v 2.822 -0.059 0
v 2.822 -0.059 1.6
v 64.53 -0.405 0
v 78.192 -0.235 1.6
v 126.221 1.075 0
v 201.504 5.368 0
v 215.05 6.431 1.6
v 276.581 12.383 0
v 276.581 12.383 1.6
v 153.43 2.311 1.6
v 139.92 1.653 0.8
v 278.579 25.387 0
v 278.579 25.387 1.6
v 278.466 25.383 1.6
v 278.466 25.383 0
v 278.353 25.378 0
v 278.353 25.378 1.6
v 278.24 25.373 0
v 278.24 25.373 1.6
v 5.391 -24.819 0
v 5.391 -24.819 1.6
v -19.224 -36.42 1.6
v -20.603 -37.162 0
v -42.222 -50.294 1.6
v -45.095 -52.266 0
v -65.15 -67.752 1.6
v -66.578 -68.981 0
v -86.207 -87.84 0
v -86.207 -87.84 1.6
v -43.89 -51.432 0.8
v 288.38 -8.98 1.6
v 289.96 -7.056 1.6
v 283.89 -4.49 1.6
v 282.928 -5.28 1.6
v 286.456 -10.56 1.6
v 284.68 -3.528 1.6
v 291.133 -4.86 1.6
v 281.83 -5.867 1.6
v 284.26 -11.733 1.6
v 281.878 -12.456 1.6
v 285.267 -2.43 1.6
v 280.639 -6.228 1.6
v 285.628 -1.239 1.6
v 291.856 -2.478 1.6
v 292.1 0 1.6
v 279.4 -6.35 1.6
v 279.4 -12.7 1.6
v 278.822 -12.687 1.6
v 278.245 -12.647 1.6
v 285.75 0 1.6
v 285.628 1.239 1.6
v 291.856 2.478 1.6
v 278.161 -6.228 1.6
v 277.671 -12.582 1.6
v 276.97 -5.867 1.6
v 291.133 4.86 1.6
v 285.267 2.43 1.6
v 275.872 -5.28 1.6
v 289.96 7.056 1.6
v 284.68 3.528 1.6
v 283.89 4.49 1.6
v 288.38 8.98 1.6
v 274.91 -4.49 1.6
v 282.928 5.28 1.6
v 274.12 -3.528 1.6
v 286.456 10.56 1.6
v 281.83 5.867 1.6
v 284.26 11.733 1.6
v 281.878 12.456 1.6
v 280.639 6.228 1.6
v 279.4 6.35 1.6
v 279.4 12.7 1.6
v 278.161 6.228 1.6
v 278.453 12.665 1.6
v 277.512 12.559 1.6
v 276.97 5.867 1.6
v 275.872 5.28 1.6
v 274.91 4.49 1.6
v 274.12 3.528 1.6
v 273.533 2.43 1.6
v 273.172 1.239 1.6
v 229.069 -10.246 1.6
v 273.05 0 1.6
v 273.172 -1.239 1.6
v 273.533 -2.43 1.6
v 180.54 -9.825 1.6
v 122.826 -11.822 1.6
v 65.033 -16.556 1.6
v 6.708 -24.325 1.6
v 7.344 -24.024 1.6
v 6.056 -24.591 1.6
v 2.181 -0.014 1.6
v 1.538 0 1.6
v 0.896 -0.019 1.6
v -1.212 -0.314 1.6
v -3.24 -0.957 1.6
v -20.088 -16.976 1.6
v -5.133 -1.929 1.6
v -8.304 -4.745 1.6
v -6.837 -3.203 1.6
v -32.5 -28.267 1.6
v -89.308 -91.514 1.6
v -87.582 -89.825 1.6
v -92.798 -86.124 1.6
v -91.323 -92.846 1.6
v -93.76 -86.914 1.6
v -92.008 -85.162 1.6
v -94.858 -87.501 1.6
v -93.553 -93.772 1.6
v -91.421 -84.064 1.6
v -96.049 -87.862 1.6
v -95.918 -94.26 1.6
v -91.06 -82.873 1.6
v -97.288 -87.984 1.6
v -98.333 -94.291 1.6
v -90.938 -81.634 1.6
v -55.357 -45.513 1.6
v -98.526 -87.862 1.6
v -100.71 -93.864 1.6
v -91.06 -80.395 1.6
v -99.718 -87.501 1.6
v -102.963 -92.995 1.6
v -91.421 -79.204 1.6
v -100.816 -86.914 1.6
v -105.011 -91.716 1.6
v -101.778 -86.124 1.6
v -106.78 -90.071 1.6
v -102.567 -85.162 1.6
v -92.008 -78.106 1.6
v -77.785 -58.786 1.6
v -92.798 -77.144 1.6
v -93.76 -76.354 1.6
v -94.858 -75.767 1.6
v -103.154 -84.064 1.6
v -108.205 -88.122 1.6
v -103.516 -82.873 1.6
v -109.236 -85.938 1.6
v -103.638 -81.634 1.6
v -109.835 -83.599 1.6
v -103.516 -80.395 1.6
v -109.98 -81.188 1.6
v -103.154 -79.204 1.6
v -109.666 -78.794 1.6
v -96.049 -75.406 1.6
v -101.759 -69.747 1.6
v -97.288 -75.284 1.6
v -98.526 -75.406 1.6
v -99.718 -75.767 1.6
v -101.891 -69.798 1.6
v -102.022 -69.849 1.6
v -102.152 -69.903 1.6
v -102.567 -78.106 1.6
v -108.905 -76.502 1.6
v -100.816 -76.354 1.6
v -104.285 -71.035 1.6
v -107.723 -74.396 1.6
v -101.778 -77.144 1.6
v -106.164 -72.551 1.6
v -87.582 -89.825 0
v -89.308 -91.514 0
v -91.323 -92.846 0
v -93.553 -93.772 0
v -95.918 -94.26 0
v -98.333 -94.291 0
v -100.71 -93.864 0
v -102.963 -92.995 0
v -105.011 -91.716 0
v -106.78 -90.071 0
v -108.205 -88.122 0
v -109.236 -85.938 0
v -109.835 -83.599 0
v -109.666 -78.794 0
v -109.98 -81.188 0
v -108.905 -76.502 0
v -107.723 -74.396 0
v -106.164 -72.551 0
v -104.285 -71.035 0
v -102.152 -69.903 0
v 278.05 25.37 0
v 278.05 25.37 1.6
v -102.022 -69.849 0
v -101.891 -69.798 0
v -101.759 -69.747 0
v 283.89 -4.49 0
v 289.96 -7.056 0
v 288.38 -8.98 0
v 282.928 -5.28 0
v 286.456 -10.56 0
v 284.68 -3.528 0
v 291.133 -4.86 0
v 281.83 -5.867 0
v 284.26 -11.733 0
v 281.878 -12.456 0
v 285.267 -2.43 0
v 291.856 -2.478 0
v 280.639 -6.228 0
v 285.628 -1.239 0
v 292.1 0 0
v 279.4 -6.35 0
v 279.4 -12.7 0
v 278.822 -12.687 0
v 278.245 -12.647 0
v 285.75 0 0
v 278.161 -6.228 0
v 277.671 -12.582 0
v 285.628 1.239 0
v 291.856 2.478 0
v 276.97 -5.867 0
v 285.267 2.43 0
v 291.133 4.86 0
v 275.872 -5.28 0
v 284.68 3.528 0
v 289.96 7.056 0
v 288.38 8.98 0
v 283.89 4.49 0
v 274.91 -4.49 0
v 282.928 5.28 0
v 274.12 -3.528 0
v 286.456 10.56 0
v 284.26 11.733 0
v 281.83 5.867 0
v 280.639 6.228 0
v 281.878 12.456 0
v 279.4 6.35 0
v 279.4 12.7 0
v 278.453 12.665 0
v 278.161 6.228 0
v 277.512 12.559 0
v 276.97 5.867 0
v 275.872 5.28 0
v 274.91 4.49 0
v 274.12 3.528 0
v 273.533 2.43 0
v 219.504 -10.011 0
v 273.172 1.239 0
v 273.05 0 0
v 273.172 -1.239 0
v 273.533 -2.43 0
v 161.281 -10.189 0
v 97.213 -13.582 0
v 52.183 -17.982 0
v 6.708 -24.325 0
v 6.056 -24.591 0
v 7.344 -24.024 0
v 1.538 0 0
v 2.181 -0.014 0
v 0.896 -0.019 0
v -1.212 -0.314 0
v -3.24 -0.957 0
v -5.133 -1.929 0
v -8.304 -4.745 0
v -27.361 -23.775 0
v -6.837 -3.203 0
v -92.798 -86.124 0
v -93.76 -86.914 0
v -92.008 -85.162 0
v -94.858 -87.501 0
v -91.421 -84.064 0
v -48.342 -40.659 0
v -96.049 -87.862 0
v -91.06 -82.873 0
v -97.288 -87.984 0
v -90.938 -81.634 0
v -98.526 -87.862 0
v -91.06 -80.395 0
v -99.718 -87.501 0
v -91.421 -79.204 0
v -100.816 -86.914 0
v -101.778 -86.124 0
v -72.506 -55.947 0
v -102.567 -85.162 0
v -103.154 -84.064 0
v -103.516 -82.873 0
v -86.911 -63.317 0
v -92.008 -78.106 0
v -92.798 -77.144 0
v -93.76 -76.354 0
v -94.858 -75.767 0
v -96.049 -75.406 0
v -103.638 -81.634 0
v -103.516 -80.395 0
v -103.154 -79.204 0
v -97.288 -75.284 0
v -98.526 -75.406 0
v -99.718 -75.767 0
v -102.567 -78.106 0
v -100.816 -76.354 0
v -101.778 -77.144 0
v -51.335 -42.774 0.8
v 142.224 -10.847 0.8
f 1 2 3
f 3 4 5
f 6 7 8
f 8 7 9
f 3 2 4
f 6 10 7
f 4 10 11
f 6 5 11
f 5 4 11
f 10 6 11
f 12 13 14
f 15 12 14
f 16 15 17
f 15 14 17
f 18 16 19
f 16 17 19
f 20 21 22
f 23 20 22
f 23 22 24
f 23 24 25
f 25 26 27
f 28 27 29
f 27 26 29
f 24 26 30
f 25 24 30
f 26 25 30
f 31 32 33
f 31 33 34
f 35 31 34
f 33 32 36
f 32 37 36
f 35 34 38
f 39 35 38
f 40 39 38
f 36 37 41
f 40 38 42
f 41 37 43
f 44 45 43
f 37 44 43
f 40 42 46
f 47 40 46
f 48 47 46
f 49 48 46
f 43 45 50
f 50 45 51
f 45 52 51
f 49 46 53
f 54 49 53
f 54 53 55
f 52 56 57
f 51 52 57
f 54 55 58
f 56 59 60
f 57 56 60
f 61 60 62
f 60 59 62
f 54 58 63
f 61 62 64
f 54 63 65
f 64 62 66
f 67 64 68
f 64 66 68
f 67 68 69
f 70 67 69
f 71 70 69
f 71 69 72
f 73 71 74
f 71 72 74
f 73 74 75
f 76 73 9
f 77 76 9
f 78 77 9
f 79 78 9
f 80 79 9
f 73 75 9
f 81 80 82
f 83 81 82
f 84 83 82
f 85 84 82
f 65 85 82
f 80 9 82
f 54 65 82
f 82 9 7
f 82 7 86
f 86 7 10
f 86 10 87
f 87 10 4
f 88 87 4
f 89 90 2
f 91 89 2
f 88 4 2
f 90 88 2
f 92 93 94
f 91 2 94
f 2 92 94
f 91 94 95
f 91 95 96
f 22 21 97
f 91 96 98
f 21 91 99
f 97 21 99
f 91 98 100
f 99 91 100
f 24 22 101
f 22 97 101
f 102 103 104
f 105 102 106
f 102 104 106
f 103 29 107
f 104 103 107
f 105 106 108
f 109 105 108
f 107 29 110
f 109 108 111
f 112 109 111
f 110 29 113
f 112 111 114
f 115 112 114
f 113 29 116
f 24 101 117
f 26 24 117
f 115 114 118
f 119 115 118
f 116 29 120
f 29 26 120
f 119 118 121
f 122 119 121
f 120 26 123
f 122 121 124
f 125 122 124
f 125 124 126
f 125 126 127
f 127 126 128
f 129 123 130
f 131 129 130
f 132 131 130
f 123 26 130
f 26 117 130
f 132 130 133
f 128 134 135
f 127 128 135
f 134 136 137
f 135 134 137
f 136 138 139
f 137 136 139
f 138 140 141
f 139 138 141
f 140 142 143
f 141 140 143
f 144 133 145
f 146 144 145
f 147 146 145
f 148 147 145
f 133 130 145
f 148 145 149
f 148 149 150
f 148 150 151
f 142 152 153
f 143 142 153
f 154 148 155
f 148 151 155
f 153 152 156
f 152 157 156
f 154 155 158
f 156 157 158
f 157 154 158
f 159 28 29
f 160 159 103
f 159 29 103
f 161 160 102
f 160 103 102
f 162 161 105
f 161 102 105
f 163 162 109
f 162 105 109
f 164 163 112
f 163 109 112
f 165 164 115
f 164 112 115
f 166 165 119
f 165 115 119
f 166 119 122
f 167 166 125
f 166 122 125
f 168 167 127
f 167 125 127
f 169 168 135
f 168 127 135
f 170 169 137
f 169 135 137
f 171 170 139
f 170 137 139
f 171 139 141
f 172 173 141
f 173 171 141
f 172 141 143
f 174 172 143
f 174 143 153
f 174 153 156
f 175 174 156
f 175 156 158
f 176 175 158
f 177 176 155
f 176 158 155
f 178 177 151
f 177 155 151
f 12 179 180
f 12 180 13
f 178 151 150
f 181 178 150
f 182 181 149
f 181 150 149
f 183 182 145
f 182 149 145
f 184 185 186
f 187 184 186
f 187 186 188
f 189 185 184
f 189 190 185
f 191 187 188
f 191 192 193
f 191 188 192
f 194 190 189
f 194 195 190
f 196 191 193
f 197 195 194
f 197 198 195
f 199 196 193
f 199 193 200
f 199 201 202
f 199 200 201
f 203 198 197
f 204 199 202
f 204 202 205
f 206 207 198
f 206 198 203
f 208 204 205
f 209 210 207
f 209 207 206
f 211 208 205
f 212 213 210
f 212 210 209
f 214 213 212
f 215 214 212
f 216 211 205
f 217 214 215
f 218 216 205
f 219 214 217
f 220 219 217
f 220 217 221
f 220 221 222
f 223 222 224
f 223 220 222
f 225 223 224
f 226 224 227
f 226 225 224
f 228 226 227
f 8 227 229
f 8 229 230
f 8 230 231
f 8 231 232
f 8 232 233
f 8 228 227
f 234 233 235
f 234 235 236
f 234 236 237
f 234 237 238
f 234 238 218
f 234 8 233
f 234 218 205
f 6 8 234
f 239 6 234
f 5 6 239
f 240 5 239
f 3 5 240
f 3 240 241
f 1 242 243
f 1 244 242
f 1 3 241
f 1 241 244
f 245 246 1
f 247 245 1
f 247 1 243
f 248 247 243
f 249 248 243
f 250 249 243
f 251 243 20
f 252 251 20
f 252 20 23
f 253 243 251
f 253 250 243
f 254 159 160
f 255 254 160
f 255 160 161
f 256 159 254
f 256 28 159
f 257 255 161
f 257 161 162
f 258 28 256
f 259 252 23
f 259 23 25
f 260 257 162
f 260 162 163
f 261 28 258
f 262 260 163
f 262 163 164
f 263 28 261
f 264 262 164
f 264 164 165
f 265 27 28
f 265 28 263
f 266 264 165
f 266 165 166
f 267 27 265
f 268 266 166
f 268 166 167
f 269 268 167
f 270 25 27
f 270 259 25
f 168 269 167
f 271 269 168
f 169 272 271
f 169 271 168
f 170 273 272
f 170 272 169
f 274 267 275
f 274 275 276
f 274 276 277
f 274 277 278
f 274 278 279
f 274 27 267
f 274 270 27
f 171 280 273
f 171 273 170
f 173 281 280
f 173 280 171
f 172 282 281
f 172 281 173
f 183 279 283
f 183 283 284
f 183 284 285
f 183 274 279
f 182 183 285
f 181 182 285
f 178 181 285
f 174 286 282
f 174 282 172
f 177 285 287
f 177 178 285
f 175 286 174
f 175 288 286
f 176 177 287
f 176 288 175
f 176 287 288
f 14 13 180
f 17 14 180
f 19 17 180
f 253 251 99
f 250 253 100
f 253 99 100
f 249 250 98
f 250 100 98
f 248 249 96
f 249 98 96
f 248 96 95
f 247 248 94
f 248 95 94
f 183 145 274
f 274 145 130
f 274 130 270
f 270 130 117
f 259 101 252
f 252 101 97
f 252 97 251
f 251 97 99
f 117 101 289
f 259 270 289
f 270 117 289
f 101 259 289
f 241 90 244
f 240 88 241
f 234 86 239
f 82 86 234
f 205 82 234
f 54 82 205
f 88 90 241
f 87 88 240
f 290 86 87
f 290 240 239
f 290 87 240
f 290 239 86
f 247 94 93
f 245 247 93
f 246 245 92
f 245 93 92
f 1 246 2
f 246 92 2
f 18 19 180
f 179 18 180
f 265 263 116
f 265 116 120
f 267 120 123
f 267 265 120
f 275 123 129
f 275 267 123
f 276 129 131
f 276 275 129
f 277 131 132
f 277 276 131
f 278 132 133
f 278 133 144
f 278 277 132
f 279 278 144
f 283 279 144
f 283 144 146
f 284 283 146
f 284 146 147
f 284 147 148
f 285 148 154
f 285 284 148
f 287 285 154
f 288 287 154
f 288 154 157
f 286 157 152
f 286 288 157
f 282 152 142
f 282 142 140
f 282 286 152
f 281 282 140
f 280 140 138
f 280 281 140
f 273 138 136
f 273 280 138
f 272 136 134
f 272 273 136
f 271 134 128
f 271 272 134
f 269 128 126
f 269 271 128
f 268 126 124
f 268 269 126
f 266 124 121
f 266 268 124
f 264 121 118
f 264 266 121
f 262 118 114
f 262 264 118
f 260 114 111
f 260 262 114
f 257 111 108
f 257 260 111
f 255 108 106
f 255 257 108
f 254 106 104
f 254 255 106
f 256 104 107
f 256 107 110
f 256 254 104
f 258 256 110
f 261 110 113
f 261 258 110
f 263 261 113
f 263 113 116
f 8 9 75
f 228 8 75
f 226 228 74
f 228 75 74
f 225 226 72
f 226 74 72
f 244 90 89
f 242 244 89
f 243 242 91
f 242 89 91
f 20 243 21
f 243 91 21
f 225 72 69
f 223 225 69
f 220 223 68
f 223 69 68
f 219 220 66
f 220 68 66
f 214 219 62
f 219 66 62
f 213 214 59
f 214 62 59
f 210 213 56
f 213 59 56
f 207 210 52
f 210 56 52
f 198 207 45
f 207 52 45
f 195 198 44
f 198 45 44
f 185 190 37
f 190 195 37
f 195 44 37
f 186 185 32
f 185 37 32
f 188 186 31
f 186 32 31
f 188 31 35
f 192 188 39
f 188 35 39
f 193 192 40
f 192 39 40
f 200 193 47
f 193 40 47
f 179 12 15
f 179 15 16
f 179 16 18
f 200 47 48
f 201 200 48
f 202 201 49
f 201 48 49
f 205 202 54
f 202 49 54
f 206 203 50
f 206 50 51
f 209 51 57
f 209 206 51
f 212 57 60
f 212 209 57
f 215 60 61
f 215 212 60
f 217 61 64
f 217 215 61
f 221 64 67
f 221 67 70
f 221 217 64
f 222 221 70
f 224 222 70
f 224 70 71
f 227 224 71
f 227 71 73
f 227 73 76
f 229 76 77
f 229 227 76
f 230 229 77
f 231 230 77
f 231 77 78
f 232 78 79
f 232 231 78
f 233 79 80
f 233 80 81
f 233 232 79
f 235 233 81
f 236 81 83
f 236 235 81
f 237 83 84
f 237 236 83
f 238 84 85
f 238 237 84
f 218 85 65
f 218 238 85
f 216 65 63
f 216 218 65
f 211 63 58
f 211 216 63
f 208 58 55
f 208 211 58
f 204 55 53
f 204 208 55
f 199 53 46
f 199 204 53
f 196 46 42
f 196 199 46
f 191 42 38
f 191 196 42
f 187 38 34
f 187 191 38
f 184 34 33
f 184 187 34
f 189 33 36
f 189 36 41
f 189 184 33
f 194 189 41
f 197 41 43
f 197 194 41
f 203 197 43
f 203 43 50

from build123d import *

# Parameters (mm, degrees)
SKETCH1_R           = 6.35
BOSS_EXTRUDE1_DEPTH = 1.6002
CUT_EXTRUDE1_DEPTH  = 324.050899169


with BuildPart() as part:
    # Sketch1 → Boss-Extrude1 (new body)
    with BuildSketch(Plane.XY):
        with BuildLine():
            Line((2.626401935, -38.912231208), (-82.119119601, -102.007437023))
            ThreePointArc((-82.119119601, -102.007437023), (-117.661054869, -96.802551105), (-112.456168951, -61.260615837))
            Line((-112.456168951, -61.260615837), (-10.589115987, 14.582007538))
            ThreePointArc((-10.589115987, 14.582007538), (-2.059055044, 17.903201209), (7.002261578, 16.605199607))
            Line((7.002261578, 16.605199607), (278.579111194, 25.386731605))
            ThreePointArc((278.579111194, 25.386731605), (304.786731605, 0.820888806), (280.220888806, -25.386731605))
            Line((280.220888806, -25.386731605), (16.974037803, -33.898910196))
            ThreePointArc((16.974037803, -33.898910196), (9.416461191, -35.307290789), (2.626401935, -38.912231208))
        make_face()
        with Locations((279.4, 0)):
            Circle(SKETCH1_R, mode=Mode.SUBTRACT)
        with Locations((-97.287644276, -81.63402643)):
            Circle(SKETCH1_R, mode=Mode.SUBTRACT)
    extrude(amount=BOSS_EXTRUDE1_DEPTH)

    # Sketch2 → Cut-Extrude1 (cut, through all)
    with BuildSketch(Plane.XY.offset(1.6002)):
        with BuildLine():
            Line((-53.969446012, -4.744671806), (-134.329544165, -73.239132517))
            ThreePointArc((-134.329544165, -73.239132517), (-125.60525441, -106.945872422), (-93.084490484, -119.382007693))
            Line((-93.084490484, -119.382007693), (5.391196219, -67.591740386))
            Line((5.391196219, -67.591740386), (280.559963716, -25.373499644))
            ThreePointArc((280.559963716, -25.373499644), (304.773499644, 1.159963716), (278.240036284, 25.373499644))
            Line((278.240036284, 25.373499644), (46.741351585, 20.654902712))
            ThreePointArc((46.741351585, 20.654902712), (10.69565429, 42.688659664), (-30.505126744, 33.346583817))
            ThreePointArc((-30.505126744, 33.346583817), (-46.196248082, 16.739687412), (-53.969446012, -4.744671806))
        make_face()
        with BuildLine():
            ThreePointArc((-102.152006015, -69.902531007), (-101.956358466, -69.823306392), (-101.759421239, -69.747344354))
            add(Edge.make_bspline(
                [(-101.759421239, -69.747344354), (-47.637210532, -48.302448827), (-8.304397238, -4.744671806)],
                knots=[0.003611947, 0.003611947, 0.003611947, 1, 1, 1], degree=2))
            ThreePointArc((-8.304397238, -4.744671806), (-4.207074532, -1.402956863), (0.895916614, -0.019268502))
            ThreePointArc((0.895916614, -0.019268502), (1.85975658, -0.002755052), (2.822072535, -0.059395822))
            add(Edge.make_bspline(
                [(2.822072535, -0.059395822), (140.13746109, -2.856877681), (276.581108414, 12.383208398)],
                knots=[0.010068083, 0.010068083, 0.010068083, 0.989878349, 0.989878349, 0.989878349], degree=2))
            ThreePointArc((276.581108414, 12.383208398), (277.981681745, 12.620553606), (279.4, 12.7))
            ThreePointArc((279.4, 12.7), (292.1, 0), (279.4, -12.7))
            ThreePointArc((279.4, -12.7), (278.533255688, -12.670388877), (277.670553151, -12.58169359))
            add(Edge.make_bspline(
                [(7.343872653, -24.024450777), (141.939870387, -3.391503831), (277.670553151, -12.58169359)],
                knots=[0, 0, 0, 0.993669622, 0.993669622, 0.993669622], degree=2))
            ThreePointArc((7.343872653, -24.024450777), (6.384059671, -24.462532684), (5.391196219, -24.819434467))
            add(Edge.make_bspline(
                [(5.391196219, -24.819434467), (-47.371168783, -46.53348503), (-86.207298162, -87.840146796)],
                knots=[0.018124898, 0.018124898, 0.018124898, 1, 1, 1], degree=2))
            ThreePointArc((-86.207298162, -87.840146796), (-106.779700454, -90.071494623), (-102.152006015, -69.902531007))
        make_face(mode=Mode.SUBTRACT)
    extrude(amount=-CUT_EXTRUDE1_DEPTH, mode=Mode.SUBTRACT)


with BuildPart() as cut_extrude1_piece_1:
    # of the separate pieces the step leaves, piece 1, a body of its own (cut_extrude1_pieces)
    add(part.part.solids().sort_by_distance((277.670553151, -12.58169359, 0))[0])


with BuildPart() as cut_extrude1_piece_2:
    # of the separate pieces the step leaves, piece 2, a body of its own (cut_extrude1_pieces)
    add(part.part.solids().sort_by_distance((278.050297658, 25.369632235, 0))[0])


solid = Compound([cut_extrude1_piece_1.part, cut_extrude1_piece_2.part])
